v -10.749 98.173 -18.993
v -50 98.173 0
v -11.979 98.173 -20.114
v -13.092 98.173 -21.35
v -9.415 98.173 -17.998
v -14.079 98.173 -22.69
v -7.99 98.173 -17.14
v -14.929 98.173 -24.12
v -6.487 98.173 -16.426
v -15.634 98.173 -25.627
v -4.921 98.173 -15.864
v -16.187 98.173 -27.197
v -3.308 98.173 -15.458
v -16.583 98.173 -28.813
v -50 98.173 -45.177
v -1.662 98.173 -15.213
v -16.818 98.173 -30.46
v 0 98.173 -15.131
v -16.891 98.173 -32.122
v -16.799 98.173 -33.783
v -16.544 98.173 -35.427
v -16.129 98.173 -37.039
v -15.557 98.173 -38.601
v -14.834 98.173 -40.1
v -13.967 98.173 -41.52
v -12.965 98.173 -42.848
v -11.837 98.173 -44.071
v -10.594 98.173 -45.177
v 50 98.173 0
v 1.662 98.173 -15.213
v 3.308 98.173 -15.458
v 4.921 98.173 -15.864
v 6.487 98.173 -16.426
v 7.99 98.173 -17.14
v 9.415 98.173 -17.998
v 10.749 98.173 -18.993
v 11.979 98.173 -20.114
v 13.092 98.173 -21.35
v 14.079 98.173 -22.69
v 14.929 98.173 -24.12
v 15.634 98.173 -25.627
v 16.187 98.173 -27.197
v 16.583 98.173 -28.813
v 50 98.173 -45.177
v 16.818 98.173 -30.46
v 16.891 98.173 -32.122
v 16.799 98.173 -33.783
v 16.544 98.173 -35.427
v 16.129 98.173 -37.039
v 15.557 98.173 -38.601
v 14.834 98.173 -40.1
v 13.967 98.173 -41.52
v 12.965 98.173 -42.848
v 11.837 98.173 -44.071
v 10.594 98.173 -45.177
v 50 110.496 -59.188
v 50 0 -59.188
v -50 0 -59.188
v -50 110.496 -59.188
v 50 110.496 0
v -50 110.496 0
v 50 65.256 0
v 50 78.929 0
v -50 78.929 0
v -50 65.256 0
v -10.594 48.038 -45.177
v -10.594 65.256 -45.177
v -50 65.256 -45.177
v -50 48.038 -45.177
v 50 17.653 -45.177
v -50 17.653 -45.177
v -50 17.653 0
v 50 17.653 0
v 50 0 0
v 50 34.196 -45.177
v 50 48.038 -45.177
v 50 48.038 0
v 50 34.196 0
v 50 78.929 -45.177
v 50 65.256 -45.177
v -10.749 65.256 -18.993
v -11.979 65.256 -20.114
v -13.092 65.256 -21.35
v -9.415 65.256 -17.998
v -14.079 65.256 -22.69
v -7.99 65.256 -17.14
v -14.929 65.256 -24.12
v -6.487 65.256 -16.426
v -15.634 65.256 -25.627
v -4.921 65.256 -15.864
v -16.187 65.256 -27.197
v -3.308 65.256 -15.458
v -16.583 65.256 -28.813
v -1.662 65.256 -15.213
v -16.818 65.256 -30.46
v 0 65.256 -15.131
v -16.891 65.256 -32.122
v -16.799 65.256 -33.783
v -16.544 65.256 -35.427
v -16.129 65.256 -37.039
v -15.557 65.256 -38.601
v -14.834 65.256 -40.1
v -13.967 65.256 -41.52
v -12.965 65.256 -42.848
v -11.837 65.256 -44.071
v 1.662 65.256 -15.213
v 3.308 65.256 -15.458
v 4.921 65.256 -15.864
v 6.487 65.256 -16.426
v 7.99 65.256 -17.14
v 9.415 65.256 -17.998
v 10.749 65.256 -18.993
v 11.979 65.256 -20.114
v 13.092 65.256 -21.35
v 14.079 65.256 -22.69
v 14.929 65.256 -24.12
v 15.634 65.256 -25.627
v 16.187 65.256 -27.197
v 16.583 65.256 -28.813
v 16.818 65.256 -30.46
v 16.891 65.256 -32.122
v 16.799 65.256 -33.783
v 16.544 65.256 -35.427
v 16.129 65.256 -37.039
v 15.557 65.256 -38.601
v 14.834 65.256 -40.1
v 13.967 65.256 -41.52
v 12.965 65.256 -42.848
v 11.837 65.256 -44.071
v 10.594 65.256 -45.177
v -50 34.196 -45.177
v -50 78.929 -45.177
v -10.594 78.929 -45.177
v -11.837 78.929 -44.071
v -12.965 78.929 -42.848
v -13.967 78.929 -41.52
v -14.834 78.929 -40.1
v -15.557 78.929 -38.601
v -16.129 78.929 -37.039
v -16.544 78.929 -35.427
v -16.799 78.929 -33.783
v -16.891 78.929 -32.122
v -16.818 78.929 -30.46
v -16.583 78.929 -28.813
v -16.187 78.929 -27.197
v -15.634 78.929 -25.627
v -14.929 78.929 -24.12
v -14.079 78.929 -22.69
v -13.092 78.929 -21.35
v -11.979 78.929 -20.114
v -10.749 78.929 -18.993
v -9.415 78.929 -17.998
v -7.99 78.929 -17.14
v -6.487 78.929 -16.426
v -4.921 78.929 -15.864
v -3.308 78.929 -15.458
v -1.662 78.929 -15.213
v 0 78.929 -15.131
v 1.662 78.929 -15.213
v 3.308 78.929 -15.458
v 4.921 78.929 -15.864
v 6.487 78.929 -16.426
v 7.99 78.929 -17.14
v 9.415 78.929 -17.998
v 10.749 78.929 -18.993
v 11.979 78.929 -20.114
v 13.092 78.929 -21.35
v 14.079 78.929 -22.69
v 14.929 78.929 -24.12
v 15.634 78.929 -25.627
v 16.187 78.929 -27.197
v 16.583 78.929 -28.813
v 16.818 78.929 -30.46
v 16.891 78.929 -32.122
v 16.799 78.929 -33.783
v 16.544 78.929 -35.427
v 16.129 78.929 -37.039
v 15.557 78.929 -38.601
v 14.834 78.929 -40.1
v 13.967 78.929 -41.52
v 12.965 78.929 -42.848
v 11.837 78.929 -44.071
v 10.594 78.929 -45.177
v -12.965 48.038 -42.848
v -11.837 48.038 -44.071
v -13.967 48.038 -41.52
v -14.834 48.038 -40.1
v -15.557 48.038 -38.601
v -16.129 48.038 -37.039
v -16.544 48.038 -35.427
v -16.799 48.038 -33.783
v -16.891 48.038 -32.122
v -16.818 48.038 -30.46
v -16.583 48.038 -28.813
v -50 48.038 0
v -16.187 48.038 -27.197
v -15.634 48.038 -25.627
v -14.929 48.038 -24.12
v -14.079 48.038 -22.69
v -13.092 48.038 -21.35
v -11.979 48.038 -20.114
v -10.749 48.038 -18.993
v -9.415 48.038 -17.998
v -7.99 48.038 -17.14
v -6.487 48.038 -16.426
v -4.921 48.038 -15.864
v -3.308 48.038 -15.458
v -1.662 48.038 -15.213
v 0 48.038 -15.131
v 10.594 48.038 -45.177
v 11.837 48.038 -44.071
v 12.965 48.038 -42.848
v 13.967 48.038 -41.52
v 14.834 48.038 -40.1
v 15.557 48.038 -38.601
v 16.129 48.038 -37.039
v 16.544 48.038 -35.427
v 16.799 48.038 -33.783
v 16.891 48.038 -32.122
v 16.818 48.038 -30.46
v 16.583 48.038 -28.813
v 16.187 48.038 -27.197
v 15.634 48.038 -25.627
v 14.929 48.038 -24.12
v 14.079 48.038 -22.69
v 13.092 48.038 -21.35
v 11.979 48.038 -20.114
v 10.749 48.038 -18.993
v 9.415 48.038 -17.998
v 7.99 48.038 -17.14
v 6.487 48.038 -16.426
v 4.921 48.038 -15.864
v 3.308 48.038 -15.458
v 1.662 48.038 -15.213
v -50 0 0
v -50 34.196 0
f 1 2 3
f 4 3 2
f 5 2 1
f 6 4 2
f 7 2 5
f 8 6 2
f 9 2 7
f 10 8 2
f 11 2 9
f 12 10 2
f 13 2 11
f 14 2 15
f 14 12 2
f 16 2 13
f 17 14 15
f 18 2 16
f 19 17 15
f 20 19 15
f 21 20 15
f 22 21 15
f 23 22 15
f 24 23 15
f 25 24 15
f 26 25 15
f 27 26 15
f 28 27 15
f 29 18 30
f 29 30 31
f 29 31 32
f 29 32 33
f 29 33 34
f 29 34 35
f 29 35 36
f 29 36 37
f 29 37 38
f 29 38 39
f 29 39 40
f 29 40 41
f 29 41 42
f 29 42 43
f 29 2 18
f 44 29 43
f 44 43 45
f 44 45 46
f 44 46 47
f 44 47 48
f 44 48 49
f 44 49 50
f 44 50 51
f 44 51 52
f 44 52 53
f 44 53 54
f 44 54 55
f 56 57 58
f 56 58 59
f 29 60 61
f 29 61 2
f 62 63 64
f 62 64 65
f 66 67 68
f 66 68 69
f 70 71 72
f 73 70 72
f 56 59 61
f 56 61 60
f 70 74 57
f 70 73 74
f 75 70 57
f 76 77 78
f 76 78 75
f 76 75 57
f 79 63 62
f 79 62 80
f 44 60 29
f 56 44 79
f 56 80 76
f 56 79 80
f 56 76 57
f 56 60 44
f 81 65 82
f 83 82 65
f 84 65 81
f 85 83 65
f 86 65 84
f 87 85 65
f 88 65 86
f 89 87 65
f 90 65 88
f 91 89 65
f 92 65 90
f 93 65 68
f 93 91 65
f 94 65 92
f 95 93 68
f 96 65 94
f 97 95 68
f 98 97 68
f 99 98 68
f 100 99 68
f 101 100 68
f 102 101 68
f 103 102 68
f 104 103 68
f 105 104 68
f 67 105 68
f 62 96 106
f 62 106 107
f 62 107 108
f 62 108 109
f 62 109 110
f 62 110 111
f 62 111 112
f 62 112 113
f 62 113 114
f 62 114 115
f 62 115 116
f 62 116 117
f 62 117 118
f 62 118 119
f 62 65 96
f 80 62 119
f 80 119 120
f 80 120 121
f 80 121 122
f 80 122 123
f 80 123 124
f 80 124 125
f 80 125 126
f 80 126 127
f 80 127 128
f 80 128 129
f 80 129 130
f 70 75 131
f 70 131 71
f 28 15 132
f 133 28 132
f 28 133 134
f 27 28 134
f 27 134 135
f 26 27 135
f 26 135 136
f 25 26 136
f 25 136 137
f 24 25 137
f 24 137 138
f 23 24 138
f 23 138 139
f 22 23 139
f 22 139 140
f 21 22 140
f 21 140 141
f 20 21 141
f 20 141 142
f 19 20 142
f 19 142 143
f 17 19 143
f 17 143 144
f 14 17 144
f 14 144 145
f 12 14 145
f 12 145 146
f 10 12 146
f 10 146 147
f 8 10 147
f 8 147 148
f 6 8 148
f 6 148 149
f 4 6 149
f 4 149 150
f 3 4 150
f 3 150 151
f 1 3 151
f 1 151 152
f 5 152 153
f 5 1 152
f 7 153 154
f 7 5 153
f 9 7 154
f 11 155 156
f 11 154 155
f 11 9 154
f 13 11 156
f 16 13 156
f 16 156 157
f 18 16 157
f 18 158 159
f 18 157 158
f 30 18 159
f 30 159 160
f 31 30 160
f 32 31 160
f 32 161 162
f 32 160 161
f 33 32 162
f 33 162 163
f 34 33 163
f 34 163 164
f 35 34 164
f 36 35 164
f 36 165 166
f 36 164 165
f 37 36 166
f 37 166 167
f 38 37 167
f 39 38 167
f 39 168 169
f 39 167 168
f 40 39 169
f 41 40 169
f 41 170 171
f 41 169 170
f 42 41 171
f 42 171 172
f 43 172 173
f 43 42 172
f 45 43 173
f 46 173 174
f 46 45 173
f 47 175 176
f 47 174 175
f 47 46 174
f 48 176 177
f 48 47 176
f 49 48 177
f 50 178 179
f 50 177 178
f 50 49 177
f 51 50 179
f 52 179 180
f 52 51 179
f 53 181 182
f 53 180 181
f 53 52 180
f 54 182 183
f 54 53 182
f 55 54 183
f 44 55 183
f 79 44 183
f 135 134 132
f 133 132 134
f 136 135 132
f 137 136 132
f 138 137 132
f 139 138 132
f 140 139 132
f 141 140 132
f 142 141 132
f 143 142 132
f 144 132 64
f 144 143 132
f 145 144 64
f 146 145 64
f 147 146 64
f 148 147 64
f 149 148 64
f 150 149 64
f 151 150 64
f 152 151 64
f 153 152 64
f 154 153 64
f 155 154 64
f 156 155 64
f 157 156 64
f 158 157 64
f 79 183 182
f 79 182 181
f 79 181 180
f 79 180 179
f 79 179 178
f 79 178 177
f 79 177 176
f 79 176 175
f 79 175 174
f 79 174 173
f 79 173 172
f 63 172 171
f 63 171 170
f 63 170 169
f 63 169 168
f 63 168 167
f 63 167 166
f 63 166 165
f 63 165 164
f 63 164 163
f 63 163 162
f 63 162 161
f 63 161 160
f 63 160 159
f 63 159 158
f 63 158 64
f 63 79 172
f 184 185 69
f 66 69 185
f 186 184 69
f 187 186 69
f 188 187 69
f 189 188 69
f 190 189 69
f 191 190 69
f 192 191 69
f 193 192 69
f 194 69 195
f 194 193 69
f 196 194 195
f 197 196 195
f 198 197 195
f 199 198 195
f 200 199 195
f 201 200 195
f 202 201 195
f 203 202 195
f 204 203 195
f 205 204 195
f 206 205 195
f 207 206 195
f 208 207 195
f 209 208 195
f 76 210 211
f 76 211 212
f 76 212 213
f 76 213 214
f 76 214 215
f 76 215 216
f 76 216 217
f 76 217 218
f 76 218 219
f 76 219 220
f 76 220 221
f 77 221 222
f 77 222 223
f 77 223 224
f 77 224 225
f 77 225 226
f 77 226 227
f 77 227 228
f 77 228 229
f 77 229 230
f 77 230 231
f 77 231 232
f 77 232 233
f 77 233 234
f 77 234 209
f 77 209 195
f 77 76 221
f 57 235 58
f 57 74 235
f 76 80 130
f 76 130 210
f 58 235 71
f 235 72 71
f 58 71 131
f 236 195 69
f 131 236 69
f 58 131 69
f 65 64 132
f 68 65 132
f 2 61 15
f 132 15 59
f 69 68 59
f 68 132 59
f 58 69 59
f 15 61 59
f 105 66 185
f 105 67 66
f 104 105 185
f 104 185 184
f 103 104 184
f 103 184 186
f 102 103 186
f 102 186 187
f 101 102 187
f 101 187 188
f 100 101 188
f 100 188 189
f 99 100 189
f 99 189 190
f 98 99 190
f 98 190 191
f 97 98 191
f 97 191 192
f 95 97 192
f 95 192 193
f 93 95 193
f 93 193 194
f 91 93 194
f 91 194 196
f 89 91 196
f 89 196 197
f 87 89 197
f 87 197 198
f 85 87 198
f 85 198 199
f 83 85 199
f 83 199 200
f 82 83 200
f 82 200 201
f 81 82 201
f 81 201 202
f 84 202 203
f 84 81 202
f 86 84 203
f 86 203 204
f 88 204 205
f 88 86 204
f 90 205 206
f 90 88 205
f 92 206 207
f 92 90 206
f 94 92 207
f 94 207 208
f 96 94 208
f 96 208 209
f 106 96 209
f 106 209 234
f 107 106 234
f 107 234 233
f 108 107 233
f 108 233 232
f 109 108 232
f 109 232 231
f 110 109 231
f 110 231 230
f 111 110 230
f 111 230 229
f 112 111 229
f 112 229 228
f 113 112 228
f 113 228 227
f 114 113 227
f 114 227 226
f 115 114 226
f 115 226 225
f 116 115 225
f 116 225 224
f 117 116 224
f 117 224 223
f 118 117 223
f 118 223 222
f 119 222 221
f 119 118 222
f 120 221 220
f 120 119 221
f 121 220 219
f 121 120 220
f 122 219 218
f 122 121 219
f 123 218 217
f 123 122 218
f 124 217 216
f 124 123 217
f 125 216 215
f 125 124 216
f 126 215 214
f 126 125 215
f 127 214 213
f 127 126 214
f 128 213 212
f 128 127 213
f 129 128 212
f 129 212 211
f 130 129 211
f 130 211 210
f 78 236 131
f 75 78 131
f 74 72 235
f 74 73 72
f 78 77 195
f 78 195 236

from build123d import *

# Parameters (mm, degrees)
BOSS_EXTRUDE1_DEPTH = 50
SKETCH4_R           = 16.890804547
BOSS_EXTRUDE2_DEPTH = 62.458045


with BuildPart() as part:
    # Sketch2 → Boss-Extrude1 (new, symmetric)
    with BuildSketch(Plane(origin=(0, 0, 0), x_dir=(0, 0, -1), z_dir=(1, 0, 0))):
        Polygon((0, 0), (59.188081664, 0), (59.188081664, 110.495775099), (0, 110.495775099), (0, 98.172971619), (45.177222912, 98.172971619), (45.177222912, 78.929141526), (0, 78.929141526), (0, 65.255893829), (45.177222912, 65.255893829), (45.177222912, 48.037730062), (0, 48.037730062), (0, 34.195676837), (45.177222912, 34.195676837), (45.177222912, 17.652735178), (0, 17.652735178), align=None)
    extrude(amount=BOSS_EXTRUDE1_DEPTH, both=True)

    # Sketch4 → Boss-Extrude2 (add)
    with BuildSketch(Plane(origin=(0, 110.495775099, 0), x_dir=(1, 0, 0), z_dir=(0, 1, 0))):
        with Locations((0, 32.021799432)):
            Circle(SKETCH4_R)
    extrude(amount=-BOSS_EXTRUDE2_DEPTH)


solid = part.part
